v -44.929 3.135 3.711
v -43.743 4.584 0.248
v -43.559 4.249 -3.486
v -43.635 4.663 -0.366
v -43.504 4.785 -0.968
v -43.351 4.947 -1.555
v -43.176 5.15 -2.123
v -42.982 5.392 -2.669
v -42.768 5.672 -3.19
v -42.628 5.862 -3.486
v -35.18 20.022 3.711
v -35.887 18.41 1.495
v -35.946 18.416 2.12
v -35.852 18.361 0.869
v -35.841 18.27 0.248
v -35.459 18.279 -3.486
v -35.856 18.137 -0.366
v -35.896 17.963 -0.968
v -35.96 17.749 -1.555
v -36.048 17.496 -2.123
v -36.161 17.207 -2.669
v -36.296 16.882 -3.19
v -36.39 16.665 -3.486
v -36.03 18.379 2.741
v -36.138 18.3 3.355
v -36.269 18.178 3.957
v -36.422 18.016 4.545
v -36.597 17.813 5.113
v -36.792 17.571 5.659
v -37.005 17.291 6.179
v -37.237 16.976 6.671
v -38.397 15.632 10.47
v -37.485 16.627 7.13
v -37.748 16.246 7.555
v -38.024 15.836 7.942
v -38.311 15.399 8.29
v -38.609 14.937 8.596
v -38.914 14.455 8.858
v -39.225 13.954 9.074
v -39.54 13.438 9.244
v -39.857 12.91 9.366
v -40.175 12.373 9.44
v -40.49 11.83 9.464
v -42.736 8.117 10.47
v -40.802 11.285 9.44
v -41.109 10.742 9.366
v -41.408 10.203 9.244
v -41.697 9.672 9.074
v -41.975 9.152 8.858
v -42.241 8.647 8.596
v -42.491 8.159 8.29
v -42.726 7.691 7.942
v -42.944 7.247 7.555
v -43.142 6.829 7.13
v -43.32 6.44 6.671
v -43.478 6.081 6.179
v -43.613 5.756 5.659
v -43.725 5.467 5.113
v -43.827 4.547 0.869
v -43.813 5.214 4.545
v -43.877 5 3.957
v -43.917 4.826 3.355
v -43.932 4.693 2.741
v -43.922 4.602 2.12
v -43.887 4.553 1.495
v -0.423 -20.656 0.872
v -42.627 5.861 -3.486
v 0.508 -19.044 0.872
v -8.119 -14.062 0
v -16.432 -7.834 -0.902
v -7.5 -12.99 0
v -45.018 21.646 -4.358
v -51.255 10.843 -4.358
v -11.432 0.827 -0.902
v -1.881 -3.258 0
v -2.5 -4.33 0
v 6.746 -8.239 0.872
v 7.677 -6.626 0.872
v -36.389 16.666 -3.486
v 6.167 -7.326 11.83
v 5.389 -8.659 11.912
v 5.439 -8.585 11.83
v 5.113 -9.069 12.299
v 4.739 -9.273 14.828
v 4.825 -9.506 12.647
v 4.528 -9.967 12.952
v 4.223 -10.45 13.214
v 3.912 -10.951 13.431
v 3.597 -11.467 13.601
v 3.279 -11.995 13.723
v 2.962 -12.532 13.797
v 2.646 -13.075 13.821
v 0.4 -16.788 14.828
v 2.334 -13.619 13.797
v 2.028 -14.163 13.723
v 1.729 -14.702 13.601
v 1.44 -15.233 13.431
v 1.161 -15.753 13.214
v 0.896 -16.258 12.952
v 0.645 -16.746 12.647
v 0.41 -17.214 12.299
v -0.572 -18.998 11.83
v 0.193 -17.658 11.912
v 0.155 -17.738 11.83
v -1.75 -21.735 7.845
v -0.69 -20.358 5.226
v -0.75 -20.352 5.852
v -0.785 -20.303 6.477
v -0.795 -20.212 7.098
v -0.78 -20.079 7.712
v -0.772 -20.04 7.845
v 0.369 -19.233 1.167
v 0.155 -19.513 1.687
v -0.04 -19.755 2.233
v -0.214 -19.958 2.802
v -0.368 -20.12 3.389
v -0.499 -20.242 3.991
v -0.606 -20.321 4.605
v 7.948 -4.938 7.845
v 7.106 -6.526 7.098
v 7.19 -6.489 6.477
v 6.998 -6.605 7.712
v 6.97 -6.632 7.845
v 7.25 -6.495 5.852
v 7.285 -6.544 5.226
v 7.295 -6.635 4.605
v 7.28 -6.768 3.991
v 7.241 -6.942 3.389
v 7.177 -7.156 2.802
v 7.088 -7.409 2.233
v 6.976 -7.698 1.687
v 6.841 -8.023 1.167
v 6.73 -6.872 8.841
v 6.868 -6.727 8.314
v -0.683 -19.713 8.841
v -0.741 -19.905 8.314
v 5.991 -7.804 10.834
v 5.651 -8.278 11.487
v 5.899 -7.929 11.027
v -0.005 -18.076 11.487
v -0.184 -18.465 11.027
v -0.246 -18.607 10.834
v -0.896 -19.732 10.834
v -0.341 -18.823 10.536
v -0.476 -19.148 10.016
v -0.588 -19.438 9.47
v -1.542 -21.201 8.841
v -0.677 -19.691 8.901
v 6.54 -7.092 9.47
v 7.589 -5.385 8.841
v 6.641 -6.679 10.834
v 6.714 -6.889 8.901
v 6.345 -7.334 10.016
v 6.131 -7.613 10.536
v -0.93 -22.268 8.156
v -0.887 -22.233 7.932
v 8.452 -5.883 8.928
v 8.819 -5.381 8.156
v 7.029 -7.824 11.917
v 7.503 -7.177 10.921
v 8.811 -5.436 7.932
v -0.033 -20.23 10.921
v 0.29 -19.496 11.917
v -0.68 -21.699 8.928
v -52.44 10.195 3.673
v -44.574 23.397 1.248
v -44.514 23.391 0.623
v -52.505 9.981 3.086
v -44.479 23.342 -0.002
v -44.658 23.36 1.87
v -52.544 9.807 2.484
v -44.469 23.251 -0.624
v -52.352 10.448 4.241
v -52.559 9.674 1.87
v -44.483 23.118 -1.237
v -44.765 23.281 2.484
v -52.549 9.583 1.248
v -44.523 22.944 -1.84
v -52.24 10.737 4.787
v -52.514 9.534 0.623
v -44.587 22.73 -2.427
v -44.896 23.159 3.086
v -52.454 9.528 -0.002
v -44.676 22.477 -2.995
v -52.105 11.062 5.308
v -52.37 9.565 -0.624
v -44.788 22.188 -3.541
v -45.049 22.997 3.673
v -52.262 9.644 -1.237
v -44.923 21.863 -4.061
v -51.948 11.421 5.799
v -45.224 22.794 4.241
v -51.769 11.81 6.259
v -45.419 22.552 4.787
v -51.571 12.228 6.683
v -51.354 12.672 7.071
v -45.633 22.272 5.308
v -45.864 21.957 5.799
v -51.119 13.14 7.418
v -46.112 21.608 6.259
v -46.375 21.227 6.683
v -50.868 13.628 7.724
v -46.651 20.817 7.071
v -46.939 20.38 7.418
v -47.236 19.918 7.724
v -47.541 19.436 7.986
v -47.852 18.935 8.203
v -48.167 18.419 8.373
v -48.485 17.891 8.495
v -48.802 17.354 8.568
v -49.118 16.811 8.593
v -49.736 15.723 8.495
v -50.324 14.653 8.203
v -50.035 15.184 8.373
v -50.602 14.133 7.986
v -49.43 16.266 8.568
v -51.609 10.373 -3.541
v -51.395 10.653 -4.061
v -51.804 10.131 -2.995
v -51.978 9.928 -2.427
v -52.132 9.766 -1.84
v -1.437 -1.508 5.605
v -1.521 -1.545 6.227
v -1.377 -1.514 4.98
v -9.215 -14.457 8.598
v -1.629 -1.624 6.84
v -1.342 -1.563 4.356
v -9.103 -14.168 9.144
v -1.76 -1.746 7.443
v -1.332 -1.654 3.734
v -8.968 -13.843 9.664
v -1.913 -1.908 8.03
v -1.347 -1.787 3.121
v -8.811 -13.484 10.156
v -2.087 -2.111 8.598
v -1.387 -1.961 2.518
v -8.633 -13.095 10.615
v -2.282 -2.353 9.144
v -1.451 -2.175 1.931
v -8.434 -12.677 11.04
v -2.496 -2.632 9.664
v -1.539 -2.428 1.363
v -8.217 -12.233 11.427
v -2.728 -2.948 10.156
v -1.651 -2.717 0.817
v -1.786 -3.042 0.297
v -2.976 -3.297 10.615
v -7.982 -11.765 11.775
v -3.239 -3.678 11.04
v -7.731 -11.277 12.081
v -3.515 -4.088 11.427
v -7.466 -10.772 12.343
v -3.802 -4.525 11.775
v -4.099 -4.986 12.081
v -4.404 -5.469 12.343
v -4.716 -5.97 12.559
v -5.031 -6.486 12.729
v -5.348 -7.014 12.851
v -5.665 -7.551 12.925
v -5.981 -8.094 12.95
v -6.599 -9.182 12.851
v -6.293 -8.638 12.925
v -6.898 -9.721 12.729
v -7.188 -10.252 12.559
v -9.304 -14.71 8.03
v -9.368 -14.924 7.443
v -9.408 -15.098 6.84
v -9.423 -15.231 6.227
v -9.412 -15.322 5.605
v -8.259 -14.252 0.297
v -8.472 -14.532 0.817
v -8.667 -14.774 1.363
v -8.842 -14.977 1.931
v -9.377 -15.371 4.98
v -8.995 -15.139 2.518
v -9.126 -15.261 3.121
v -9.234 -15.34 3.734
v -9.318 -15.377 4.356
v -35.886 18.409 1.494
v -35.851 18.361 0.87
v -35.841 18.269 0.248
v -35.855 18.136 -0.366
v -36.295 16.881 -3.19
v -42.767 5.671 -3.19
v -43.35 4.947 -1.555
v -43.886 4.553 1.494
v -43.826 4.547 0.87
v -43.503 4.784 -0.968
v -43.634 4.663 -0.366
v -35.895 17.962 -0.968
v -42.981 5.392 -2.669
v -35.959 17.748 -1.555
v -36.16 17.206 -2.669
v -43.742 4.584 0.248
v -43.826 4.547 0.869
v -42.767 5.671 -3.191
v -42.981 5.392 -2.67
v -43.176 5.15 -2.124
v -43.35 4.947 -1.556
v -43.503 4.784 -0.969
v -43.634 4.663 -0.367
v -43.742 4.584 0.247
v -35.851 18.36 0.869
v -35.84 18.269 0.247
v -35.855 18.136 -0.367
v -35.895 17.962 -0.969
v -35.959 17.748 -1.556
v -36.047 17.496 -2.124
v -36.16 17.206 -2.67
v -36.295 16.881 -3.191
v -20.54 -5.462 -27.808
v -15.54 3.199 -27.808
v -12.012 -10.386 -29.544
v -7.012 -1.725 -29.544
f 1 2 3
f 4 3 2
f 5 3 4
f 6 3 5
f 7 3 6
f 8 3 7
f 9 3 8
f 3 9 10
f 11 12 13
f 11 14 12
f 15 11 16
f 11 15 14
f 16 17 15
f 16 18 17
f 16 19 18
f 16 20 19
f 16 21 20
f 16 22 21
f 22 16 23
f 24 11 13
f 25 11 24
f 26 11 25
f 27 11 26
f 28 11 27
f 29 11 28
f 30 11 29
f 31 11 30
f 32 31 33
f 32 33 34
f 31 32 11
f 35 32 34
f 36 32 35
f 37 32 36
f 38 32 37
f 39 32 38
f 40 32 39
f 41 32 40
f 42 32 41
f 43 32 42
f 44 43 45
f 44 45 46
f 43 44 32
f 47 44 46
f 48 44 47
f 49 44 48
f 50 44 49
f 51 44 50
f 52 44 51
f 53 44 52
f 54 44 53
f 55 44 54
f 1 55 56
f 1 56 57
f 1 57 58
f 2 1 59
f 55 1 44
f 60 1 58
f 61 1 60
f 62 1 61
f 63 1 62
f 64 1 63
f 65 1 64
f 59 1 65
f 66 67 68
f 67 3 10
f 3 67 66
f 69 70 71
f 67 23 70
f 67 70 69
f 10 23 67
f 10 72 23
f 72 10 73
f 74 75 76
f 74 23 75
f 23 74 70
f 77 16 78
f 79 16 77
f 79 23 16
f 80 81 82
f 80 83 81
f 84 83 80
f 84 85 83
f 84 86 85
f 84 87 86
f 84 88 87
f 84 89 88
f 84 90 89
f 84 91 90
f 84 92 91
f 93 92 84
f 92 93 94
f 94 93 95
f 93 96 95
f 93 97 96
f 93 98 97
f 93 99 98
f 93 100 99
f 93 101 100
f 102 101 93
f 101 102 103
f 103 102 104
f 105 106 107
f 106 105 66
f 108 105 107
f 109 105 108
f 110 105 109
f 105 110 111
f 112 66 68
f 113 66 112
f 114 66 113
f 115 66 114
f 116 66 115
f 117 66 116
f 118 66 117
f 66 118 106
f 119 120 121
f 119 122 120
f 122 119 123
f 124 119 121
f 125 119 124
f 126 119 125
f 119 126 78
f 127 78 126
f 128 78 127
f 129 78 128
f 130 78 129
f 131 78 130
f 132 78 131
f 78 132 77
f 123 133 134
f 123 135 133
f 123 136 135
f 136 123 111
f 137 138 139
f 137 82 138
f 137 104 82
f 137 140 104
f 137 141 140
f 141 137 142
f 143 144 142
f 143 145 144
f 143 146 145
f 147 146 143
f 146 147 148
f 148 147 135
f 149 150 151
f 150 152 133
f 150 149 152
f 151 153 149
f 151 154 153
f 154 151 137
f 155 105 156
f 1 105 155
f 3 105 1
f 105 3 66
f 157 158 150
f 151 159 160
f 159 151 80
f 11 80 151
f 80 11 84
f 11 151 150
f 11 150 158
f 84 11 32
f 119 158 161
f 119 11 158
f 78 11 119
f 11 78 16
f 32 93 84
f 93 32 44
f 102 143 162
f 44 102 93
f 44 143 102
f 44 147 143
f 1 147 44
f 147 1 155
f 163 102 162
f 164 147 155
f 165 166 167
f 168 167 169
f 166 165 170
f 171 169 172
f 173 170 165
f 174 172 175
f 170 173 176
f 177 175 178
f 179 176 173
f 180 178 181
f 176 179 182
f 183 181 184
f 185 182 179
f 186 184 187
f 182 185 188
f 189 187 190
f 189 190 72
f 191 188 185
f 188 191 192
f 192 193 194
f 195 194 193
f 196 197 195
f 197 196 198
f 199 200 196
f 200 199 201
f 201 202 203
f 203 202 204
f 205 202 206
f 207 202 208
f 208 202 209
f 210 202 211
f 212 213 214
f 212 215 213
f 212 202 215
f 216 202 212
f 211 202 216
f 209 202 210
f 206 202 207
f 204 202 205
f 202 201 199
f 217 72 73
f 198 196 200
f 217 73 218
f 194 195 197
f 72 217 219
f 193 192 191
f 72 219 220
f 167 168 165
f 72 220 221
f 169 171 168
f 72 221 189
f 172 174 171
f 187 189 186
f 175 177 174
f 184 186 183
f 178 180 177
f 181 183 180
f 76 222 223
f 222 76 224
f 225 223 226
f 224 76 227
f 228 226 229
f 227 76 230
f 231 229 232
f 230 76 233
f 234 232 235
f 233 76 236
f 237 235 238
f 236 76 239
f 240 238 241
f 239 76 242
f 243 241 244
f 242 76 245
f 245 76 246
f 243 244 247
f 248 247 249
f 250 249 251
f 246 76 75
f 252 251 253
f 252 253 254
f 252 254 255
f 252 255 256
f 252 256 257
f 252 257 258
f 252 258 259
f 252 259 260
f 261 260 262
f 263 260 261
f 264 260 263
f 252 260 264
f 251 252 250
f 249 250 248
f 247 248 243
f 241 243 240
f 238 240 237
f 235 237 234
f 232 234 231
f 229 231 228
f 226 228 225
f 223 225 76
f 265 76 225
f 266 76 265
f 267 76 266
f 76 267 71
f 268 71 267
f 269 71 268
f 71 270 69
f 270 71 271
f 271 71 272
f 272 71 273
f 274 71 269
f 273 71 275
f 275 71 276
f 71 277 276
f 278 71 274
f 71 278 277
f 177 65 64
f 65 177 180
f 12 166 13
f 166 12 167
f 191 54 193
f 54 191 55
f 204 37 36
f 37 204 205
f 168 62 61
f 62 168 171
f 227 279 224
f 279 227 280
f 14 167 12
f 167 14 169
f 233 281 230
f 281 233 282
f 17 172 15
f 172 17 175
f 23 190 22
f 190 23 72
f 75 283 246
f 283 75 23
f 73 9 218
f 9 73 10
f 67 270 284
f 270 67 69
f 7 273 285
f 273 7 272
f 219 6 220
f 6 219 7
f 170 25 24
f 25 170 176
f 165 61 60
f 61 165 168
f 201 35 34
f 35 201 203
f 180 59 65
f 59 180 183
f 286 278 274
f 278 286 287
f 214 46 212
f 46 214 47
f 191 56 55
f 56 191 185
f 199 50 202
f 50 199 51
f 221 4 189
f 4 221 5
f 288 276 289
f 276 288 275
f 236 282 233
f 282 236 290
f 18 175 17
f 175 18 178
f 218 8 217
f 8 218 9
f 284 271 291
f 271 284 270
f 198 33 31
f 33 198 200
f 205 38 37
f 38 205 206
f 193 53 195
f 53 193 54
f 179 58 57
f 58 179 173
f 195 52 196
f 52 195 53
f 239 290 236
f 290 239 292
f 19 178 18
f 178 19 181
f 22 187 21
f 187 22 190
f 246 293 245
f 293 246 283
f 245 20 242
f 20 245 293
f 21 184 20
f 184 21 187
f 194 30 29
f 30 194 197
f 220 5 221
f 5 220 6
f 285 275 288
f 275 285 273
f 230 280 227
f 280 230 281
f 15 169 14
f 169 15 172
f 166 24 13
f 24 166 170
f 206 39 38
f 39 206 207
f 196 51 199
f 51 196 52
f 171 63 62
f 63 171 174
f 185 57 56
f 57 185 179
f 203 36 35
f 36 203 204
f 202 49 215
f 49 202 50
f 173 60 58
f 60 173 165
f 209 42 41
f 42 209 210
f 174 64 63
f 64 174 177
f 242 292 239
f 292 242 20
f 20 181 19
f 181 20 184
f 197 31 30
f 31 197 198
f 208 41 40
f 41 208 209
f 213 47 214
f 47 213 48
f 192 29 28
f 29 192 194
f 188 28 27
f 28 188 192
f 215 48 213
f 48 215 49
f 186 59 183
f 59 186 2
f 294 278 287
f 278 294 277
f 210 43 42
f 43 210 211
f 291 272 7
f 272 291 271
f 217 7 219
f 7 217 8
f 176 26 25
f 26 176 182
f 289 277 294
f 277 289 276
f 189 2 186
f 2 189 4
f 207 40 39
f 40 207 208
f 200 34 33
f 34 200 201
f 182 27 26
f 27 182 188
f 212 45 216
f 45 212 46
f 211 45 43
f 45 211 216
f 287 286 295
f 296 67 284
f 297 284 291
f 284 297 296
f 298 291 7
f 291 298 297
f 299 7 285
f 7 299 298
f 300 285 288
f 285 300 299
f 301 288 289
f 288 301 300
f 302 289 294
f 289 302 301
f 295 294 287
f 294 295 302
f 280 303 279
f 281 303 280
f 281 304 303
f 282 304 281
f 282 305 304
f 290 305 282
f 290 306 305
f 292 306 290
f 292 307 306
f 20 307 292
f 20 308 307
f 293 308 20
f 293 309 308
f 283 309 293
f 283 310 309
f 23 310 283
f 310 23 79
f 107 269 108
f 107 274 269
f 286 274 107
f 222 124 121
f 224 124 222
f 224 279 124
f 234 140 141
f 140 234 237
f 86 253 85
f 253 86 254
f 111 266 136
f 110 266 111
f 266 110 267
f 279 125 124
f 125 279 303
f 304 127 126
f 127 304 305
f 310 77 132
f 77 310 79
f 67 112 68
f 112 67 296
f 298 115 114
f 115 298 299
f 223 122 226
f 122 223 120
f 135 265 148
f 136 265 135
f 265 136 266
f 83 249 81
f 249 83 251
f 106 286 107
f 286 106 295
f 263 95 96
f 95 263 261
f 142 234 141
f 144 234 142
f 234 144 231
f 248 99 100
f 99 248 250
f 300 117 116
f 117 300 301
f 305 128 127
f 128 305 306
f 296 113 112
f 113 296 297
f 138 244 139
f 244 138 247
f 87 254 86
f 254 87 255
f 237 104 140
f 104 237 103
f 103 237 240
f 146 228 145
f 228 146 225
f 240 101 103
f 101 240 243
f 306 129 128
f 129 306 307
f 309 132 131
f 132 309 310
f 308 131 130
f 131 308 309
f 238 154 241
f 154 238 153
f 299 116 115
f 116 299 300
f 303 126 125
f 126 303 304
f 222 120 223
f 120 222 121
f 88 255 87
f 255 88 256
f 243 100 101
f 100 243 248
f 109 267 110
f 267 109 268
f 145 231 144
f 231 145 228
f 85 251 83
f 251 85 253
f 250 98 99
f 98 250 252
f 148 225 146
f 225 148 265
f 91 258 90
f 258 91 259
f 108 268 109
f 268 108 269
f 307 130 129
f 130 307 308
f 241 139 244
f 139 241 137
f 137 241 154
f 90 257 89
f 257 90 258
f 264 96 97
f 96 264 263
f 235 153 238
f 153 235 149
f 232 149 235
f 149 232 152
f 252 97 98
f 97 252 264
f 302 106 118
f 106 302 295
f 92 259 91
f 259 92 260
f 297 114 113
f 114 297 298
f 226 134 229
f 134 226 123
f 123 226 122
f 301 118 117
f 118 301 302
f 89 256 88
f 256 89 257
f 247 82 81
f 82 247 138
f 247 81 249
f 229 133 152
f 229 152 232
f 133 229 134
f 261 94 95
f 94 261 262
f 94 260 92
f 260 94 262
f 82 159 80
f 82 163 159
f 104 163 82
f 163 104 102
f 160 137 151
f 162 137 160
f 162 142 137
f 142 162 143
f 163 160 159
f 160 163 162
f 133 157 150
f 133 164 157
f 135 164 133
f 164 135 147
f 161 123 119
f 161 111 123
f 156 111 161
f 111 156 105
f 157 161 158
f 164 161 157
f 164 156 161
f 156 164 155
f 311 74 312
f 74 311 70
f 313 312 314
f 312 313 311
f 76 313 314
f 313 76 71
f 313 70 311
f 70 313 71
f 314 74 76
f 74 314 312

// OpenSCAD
$fn = 80;
x = -10;
color("orange"){
rotate([0, 5, 150]){
difference(){
translate([x, 0, 0]){
intersection(){
cube([50, 20, 20]);
translate([0, 10, 5]){
rotate([0, 90, 0]){
cylinder(50, 10, 10, $fn=7);}}
}}
translate([x - 0.001, 0, -0.001]){
intersection(){
cube([50, 20, 20]);
translate([0, 10, 5]){
rotate([0, 90, 0]){
cylinder(50, 8, 8);}}
}}
}
intersection(){
translate([x - 1, 0, 10]){
cube([1, 20, 1]);}

translate([x-1, 10, 5]){
rotate([0, 90, 0]){
cylinder(50, 10, 10, $fn=7);}}
}
intersection(){
translate([x - 1, 0, 7]){
cube([1, 20, 1]);}

translate([x-1, 10, 5]){
rotate([0, 90, 0]){
cylinder(50, 10, 10, $fn=7);}}
}

translate([0, 5, 0]){
    rotate([0, 75, 0]){
cube([30, 10, 10]);}}

intersection(){
cube([50, 20, 20]);
translate([0, 10, 5]){
rotate([0, 90, 0]){
cylinder(50, 8, 8);}}
}
}
}
